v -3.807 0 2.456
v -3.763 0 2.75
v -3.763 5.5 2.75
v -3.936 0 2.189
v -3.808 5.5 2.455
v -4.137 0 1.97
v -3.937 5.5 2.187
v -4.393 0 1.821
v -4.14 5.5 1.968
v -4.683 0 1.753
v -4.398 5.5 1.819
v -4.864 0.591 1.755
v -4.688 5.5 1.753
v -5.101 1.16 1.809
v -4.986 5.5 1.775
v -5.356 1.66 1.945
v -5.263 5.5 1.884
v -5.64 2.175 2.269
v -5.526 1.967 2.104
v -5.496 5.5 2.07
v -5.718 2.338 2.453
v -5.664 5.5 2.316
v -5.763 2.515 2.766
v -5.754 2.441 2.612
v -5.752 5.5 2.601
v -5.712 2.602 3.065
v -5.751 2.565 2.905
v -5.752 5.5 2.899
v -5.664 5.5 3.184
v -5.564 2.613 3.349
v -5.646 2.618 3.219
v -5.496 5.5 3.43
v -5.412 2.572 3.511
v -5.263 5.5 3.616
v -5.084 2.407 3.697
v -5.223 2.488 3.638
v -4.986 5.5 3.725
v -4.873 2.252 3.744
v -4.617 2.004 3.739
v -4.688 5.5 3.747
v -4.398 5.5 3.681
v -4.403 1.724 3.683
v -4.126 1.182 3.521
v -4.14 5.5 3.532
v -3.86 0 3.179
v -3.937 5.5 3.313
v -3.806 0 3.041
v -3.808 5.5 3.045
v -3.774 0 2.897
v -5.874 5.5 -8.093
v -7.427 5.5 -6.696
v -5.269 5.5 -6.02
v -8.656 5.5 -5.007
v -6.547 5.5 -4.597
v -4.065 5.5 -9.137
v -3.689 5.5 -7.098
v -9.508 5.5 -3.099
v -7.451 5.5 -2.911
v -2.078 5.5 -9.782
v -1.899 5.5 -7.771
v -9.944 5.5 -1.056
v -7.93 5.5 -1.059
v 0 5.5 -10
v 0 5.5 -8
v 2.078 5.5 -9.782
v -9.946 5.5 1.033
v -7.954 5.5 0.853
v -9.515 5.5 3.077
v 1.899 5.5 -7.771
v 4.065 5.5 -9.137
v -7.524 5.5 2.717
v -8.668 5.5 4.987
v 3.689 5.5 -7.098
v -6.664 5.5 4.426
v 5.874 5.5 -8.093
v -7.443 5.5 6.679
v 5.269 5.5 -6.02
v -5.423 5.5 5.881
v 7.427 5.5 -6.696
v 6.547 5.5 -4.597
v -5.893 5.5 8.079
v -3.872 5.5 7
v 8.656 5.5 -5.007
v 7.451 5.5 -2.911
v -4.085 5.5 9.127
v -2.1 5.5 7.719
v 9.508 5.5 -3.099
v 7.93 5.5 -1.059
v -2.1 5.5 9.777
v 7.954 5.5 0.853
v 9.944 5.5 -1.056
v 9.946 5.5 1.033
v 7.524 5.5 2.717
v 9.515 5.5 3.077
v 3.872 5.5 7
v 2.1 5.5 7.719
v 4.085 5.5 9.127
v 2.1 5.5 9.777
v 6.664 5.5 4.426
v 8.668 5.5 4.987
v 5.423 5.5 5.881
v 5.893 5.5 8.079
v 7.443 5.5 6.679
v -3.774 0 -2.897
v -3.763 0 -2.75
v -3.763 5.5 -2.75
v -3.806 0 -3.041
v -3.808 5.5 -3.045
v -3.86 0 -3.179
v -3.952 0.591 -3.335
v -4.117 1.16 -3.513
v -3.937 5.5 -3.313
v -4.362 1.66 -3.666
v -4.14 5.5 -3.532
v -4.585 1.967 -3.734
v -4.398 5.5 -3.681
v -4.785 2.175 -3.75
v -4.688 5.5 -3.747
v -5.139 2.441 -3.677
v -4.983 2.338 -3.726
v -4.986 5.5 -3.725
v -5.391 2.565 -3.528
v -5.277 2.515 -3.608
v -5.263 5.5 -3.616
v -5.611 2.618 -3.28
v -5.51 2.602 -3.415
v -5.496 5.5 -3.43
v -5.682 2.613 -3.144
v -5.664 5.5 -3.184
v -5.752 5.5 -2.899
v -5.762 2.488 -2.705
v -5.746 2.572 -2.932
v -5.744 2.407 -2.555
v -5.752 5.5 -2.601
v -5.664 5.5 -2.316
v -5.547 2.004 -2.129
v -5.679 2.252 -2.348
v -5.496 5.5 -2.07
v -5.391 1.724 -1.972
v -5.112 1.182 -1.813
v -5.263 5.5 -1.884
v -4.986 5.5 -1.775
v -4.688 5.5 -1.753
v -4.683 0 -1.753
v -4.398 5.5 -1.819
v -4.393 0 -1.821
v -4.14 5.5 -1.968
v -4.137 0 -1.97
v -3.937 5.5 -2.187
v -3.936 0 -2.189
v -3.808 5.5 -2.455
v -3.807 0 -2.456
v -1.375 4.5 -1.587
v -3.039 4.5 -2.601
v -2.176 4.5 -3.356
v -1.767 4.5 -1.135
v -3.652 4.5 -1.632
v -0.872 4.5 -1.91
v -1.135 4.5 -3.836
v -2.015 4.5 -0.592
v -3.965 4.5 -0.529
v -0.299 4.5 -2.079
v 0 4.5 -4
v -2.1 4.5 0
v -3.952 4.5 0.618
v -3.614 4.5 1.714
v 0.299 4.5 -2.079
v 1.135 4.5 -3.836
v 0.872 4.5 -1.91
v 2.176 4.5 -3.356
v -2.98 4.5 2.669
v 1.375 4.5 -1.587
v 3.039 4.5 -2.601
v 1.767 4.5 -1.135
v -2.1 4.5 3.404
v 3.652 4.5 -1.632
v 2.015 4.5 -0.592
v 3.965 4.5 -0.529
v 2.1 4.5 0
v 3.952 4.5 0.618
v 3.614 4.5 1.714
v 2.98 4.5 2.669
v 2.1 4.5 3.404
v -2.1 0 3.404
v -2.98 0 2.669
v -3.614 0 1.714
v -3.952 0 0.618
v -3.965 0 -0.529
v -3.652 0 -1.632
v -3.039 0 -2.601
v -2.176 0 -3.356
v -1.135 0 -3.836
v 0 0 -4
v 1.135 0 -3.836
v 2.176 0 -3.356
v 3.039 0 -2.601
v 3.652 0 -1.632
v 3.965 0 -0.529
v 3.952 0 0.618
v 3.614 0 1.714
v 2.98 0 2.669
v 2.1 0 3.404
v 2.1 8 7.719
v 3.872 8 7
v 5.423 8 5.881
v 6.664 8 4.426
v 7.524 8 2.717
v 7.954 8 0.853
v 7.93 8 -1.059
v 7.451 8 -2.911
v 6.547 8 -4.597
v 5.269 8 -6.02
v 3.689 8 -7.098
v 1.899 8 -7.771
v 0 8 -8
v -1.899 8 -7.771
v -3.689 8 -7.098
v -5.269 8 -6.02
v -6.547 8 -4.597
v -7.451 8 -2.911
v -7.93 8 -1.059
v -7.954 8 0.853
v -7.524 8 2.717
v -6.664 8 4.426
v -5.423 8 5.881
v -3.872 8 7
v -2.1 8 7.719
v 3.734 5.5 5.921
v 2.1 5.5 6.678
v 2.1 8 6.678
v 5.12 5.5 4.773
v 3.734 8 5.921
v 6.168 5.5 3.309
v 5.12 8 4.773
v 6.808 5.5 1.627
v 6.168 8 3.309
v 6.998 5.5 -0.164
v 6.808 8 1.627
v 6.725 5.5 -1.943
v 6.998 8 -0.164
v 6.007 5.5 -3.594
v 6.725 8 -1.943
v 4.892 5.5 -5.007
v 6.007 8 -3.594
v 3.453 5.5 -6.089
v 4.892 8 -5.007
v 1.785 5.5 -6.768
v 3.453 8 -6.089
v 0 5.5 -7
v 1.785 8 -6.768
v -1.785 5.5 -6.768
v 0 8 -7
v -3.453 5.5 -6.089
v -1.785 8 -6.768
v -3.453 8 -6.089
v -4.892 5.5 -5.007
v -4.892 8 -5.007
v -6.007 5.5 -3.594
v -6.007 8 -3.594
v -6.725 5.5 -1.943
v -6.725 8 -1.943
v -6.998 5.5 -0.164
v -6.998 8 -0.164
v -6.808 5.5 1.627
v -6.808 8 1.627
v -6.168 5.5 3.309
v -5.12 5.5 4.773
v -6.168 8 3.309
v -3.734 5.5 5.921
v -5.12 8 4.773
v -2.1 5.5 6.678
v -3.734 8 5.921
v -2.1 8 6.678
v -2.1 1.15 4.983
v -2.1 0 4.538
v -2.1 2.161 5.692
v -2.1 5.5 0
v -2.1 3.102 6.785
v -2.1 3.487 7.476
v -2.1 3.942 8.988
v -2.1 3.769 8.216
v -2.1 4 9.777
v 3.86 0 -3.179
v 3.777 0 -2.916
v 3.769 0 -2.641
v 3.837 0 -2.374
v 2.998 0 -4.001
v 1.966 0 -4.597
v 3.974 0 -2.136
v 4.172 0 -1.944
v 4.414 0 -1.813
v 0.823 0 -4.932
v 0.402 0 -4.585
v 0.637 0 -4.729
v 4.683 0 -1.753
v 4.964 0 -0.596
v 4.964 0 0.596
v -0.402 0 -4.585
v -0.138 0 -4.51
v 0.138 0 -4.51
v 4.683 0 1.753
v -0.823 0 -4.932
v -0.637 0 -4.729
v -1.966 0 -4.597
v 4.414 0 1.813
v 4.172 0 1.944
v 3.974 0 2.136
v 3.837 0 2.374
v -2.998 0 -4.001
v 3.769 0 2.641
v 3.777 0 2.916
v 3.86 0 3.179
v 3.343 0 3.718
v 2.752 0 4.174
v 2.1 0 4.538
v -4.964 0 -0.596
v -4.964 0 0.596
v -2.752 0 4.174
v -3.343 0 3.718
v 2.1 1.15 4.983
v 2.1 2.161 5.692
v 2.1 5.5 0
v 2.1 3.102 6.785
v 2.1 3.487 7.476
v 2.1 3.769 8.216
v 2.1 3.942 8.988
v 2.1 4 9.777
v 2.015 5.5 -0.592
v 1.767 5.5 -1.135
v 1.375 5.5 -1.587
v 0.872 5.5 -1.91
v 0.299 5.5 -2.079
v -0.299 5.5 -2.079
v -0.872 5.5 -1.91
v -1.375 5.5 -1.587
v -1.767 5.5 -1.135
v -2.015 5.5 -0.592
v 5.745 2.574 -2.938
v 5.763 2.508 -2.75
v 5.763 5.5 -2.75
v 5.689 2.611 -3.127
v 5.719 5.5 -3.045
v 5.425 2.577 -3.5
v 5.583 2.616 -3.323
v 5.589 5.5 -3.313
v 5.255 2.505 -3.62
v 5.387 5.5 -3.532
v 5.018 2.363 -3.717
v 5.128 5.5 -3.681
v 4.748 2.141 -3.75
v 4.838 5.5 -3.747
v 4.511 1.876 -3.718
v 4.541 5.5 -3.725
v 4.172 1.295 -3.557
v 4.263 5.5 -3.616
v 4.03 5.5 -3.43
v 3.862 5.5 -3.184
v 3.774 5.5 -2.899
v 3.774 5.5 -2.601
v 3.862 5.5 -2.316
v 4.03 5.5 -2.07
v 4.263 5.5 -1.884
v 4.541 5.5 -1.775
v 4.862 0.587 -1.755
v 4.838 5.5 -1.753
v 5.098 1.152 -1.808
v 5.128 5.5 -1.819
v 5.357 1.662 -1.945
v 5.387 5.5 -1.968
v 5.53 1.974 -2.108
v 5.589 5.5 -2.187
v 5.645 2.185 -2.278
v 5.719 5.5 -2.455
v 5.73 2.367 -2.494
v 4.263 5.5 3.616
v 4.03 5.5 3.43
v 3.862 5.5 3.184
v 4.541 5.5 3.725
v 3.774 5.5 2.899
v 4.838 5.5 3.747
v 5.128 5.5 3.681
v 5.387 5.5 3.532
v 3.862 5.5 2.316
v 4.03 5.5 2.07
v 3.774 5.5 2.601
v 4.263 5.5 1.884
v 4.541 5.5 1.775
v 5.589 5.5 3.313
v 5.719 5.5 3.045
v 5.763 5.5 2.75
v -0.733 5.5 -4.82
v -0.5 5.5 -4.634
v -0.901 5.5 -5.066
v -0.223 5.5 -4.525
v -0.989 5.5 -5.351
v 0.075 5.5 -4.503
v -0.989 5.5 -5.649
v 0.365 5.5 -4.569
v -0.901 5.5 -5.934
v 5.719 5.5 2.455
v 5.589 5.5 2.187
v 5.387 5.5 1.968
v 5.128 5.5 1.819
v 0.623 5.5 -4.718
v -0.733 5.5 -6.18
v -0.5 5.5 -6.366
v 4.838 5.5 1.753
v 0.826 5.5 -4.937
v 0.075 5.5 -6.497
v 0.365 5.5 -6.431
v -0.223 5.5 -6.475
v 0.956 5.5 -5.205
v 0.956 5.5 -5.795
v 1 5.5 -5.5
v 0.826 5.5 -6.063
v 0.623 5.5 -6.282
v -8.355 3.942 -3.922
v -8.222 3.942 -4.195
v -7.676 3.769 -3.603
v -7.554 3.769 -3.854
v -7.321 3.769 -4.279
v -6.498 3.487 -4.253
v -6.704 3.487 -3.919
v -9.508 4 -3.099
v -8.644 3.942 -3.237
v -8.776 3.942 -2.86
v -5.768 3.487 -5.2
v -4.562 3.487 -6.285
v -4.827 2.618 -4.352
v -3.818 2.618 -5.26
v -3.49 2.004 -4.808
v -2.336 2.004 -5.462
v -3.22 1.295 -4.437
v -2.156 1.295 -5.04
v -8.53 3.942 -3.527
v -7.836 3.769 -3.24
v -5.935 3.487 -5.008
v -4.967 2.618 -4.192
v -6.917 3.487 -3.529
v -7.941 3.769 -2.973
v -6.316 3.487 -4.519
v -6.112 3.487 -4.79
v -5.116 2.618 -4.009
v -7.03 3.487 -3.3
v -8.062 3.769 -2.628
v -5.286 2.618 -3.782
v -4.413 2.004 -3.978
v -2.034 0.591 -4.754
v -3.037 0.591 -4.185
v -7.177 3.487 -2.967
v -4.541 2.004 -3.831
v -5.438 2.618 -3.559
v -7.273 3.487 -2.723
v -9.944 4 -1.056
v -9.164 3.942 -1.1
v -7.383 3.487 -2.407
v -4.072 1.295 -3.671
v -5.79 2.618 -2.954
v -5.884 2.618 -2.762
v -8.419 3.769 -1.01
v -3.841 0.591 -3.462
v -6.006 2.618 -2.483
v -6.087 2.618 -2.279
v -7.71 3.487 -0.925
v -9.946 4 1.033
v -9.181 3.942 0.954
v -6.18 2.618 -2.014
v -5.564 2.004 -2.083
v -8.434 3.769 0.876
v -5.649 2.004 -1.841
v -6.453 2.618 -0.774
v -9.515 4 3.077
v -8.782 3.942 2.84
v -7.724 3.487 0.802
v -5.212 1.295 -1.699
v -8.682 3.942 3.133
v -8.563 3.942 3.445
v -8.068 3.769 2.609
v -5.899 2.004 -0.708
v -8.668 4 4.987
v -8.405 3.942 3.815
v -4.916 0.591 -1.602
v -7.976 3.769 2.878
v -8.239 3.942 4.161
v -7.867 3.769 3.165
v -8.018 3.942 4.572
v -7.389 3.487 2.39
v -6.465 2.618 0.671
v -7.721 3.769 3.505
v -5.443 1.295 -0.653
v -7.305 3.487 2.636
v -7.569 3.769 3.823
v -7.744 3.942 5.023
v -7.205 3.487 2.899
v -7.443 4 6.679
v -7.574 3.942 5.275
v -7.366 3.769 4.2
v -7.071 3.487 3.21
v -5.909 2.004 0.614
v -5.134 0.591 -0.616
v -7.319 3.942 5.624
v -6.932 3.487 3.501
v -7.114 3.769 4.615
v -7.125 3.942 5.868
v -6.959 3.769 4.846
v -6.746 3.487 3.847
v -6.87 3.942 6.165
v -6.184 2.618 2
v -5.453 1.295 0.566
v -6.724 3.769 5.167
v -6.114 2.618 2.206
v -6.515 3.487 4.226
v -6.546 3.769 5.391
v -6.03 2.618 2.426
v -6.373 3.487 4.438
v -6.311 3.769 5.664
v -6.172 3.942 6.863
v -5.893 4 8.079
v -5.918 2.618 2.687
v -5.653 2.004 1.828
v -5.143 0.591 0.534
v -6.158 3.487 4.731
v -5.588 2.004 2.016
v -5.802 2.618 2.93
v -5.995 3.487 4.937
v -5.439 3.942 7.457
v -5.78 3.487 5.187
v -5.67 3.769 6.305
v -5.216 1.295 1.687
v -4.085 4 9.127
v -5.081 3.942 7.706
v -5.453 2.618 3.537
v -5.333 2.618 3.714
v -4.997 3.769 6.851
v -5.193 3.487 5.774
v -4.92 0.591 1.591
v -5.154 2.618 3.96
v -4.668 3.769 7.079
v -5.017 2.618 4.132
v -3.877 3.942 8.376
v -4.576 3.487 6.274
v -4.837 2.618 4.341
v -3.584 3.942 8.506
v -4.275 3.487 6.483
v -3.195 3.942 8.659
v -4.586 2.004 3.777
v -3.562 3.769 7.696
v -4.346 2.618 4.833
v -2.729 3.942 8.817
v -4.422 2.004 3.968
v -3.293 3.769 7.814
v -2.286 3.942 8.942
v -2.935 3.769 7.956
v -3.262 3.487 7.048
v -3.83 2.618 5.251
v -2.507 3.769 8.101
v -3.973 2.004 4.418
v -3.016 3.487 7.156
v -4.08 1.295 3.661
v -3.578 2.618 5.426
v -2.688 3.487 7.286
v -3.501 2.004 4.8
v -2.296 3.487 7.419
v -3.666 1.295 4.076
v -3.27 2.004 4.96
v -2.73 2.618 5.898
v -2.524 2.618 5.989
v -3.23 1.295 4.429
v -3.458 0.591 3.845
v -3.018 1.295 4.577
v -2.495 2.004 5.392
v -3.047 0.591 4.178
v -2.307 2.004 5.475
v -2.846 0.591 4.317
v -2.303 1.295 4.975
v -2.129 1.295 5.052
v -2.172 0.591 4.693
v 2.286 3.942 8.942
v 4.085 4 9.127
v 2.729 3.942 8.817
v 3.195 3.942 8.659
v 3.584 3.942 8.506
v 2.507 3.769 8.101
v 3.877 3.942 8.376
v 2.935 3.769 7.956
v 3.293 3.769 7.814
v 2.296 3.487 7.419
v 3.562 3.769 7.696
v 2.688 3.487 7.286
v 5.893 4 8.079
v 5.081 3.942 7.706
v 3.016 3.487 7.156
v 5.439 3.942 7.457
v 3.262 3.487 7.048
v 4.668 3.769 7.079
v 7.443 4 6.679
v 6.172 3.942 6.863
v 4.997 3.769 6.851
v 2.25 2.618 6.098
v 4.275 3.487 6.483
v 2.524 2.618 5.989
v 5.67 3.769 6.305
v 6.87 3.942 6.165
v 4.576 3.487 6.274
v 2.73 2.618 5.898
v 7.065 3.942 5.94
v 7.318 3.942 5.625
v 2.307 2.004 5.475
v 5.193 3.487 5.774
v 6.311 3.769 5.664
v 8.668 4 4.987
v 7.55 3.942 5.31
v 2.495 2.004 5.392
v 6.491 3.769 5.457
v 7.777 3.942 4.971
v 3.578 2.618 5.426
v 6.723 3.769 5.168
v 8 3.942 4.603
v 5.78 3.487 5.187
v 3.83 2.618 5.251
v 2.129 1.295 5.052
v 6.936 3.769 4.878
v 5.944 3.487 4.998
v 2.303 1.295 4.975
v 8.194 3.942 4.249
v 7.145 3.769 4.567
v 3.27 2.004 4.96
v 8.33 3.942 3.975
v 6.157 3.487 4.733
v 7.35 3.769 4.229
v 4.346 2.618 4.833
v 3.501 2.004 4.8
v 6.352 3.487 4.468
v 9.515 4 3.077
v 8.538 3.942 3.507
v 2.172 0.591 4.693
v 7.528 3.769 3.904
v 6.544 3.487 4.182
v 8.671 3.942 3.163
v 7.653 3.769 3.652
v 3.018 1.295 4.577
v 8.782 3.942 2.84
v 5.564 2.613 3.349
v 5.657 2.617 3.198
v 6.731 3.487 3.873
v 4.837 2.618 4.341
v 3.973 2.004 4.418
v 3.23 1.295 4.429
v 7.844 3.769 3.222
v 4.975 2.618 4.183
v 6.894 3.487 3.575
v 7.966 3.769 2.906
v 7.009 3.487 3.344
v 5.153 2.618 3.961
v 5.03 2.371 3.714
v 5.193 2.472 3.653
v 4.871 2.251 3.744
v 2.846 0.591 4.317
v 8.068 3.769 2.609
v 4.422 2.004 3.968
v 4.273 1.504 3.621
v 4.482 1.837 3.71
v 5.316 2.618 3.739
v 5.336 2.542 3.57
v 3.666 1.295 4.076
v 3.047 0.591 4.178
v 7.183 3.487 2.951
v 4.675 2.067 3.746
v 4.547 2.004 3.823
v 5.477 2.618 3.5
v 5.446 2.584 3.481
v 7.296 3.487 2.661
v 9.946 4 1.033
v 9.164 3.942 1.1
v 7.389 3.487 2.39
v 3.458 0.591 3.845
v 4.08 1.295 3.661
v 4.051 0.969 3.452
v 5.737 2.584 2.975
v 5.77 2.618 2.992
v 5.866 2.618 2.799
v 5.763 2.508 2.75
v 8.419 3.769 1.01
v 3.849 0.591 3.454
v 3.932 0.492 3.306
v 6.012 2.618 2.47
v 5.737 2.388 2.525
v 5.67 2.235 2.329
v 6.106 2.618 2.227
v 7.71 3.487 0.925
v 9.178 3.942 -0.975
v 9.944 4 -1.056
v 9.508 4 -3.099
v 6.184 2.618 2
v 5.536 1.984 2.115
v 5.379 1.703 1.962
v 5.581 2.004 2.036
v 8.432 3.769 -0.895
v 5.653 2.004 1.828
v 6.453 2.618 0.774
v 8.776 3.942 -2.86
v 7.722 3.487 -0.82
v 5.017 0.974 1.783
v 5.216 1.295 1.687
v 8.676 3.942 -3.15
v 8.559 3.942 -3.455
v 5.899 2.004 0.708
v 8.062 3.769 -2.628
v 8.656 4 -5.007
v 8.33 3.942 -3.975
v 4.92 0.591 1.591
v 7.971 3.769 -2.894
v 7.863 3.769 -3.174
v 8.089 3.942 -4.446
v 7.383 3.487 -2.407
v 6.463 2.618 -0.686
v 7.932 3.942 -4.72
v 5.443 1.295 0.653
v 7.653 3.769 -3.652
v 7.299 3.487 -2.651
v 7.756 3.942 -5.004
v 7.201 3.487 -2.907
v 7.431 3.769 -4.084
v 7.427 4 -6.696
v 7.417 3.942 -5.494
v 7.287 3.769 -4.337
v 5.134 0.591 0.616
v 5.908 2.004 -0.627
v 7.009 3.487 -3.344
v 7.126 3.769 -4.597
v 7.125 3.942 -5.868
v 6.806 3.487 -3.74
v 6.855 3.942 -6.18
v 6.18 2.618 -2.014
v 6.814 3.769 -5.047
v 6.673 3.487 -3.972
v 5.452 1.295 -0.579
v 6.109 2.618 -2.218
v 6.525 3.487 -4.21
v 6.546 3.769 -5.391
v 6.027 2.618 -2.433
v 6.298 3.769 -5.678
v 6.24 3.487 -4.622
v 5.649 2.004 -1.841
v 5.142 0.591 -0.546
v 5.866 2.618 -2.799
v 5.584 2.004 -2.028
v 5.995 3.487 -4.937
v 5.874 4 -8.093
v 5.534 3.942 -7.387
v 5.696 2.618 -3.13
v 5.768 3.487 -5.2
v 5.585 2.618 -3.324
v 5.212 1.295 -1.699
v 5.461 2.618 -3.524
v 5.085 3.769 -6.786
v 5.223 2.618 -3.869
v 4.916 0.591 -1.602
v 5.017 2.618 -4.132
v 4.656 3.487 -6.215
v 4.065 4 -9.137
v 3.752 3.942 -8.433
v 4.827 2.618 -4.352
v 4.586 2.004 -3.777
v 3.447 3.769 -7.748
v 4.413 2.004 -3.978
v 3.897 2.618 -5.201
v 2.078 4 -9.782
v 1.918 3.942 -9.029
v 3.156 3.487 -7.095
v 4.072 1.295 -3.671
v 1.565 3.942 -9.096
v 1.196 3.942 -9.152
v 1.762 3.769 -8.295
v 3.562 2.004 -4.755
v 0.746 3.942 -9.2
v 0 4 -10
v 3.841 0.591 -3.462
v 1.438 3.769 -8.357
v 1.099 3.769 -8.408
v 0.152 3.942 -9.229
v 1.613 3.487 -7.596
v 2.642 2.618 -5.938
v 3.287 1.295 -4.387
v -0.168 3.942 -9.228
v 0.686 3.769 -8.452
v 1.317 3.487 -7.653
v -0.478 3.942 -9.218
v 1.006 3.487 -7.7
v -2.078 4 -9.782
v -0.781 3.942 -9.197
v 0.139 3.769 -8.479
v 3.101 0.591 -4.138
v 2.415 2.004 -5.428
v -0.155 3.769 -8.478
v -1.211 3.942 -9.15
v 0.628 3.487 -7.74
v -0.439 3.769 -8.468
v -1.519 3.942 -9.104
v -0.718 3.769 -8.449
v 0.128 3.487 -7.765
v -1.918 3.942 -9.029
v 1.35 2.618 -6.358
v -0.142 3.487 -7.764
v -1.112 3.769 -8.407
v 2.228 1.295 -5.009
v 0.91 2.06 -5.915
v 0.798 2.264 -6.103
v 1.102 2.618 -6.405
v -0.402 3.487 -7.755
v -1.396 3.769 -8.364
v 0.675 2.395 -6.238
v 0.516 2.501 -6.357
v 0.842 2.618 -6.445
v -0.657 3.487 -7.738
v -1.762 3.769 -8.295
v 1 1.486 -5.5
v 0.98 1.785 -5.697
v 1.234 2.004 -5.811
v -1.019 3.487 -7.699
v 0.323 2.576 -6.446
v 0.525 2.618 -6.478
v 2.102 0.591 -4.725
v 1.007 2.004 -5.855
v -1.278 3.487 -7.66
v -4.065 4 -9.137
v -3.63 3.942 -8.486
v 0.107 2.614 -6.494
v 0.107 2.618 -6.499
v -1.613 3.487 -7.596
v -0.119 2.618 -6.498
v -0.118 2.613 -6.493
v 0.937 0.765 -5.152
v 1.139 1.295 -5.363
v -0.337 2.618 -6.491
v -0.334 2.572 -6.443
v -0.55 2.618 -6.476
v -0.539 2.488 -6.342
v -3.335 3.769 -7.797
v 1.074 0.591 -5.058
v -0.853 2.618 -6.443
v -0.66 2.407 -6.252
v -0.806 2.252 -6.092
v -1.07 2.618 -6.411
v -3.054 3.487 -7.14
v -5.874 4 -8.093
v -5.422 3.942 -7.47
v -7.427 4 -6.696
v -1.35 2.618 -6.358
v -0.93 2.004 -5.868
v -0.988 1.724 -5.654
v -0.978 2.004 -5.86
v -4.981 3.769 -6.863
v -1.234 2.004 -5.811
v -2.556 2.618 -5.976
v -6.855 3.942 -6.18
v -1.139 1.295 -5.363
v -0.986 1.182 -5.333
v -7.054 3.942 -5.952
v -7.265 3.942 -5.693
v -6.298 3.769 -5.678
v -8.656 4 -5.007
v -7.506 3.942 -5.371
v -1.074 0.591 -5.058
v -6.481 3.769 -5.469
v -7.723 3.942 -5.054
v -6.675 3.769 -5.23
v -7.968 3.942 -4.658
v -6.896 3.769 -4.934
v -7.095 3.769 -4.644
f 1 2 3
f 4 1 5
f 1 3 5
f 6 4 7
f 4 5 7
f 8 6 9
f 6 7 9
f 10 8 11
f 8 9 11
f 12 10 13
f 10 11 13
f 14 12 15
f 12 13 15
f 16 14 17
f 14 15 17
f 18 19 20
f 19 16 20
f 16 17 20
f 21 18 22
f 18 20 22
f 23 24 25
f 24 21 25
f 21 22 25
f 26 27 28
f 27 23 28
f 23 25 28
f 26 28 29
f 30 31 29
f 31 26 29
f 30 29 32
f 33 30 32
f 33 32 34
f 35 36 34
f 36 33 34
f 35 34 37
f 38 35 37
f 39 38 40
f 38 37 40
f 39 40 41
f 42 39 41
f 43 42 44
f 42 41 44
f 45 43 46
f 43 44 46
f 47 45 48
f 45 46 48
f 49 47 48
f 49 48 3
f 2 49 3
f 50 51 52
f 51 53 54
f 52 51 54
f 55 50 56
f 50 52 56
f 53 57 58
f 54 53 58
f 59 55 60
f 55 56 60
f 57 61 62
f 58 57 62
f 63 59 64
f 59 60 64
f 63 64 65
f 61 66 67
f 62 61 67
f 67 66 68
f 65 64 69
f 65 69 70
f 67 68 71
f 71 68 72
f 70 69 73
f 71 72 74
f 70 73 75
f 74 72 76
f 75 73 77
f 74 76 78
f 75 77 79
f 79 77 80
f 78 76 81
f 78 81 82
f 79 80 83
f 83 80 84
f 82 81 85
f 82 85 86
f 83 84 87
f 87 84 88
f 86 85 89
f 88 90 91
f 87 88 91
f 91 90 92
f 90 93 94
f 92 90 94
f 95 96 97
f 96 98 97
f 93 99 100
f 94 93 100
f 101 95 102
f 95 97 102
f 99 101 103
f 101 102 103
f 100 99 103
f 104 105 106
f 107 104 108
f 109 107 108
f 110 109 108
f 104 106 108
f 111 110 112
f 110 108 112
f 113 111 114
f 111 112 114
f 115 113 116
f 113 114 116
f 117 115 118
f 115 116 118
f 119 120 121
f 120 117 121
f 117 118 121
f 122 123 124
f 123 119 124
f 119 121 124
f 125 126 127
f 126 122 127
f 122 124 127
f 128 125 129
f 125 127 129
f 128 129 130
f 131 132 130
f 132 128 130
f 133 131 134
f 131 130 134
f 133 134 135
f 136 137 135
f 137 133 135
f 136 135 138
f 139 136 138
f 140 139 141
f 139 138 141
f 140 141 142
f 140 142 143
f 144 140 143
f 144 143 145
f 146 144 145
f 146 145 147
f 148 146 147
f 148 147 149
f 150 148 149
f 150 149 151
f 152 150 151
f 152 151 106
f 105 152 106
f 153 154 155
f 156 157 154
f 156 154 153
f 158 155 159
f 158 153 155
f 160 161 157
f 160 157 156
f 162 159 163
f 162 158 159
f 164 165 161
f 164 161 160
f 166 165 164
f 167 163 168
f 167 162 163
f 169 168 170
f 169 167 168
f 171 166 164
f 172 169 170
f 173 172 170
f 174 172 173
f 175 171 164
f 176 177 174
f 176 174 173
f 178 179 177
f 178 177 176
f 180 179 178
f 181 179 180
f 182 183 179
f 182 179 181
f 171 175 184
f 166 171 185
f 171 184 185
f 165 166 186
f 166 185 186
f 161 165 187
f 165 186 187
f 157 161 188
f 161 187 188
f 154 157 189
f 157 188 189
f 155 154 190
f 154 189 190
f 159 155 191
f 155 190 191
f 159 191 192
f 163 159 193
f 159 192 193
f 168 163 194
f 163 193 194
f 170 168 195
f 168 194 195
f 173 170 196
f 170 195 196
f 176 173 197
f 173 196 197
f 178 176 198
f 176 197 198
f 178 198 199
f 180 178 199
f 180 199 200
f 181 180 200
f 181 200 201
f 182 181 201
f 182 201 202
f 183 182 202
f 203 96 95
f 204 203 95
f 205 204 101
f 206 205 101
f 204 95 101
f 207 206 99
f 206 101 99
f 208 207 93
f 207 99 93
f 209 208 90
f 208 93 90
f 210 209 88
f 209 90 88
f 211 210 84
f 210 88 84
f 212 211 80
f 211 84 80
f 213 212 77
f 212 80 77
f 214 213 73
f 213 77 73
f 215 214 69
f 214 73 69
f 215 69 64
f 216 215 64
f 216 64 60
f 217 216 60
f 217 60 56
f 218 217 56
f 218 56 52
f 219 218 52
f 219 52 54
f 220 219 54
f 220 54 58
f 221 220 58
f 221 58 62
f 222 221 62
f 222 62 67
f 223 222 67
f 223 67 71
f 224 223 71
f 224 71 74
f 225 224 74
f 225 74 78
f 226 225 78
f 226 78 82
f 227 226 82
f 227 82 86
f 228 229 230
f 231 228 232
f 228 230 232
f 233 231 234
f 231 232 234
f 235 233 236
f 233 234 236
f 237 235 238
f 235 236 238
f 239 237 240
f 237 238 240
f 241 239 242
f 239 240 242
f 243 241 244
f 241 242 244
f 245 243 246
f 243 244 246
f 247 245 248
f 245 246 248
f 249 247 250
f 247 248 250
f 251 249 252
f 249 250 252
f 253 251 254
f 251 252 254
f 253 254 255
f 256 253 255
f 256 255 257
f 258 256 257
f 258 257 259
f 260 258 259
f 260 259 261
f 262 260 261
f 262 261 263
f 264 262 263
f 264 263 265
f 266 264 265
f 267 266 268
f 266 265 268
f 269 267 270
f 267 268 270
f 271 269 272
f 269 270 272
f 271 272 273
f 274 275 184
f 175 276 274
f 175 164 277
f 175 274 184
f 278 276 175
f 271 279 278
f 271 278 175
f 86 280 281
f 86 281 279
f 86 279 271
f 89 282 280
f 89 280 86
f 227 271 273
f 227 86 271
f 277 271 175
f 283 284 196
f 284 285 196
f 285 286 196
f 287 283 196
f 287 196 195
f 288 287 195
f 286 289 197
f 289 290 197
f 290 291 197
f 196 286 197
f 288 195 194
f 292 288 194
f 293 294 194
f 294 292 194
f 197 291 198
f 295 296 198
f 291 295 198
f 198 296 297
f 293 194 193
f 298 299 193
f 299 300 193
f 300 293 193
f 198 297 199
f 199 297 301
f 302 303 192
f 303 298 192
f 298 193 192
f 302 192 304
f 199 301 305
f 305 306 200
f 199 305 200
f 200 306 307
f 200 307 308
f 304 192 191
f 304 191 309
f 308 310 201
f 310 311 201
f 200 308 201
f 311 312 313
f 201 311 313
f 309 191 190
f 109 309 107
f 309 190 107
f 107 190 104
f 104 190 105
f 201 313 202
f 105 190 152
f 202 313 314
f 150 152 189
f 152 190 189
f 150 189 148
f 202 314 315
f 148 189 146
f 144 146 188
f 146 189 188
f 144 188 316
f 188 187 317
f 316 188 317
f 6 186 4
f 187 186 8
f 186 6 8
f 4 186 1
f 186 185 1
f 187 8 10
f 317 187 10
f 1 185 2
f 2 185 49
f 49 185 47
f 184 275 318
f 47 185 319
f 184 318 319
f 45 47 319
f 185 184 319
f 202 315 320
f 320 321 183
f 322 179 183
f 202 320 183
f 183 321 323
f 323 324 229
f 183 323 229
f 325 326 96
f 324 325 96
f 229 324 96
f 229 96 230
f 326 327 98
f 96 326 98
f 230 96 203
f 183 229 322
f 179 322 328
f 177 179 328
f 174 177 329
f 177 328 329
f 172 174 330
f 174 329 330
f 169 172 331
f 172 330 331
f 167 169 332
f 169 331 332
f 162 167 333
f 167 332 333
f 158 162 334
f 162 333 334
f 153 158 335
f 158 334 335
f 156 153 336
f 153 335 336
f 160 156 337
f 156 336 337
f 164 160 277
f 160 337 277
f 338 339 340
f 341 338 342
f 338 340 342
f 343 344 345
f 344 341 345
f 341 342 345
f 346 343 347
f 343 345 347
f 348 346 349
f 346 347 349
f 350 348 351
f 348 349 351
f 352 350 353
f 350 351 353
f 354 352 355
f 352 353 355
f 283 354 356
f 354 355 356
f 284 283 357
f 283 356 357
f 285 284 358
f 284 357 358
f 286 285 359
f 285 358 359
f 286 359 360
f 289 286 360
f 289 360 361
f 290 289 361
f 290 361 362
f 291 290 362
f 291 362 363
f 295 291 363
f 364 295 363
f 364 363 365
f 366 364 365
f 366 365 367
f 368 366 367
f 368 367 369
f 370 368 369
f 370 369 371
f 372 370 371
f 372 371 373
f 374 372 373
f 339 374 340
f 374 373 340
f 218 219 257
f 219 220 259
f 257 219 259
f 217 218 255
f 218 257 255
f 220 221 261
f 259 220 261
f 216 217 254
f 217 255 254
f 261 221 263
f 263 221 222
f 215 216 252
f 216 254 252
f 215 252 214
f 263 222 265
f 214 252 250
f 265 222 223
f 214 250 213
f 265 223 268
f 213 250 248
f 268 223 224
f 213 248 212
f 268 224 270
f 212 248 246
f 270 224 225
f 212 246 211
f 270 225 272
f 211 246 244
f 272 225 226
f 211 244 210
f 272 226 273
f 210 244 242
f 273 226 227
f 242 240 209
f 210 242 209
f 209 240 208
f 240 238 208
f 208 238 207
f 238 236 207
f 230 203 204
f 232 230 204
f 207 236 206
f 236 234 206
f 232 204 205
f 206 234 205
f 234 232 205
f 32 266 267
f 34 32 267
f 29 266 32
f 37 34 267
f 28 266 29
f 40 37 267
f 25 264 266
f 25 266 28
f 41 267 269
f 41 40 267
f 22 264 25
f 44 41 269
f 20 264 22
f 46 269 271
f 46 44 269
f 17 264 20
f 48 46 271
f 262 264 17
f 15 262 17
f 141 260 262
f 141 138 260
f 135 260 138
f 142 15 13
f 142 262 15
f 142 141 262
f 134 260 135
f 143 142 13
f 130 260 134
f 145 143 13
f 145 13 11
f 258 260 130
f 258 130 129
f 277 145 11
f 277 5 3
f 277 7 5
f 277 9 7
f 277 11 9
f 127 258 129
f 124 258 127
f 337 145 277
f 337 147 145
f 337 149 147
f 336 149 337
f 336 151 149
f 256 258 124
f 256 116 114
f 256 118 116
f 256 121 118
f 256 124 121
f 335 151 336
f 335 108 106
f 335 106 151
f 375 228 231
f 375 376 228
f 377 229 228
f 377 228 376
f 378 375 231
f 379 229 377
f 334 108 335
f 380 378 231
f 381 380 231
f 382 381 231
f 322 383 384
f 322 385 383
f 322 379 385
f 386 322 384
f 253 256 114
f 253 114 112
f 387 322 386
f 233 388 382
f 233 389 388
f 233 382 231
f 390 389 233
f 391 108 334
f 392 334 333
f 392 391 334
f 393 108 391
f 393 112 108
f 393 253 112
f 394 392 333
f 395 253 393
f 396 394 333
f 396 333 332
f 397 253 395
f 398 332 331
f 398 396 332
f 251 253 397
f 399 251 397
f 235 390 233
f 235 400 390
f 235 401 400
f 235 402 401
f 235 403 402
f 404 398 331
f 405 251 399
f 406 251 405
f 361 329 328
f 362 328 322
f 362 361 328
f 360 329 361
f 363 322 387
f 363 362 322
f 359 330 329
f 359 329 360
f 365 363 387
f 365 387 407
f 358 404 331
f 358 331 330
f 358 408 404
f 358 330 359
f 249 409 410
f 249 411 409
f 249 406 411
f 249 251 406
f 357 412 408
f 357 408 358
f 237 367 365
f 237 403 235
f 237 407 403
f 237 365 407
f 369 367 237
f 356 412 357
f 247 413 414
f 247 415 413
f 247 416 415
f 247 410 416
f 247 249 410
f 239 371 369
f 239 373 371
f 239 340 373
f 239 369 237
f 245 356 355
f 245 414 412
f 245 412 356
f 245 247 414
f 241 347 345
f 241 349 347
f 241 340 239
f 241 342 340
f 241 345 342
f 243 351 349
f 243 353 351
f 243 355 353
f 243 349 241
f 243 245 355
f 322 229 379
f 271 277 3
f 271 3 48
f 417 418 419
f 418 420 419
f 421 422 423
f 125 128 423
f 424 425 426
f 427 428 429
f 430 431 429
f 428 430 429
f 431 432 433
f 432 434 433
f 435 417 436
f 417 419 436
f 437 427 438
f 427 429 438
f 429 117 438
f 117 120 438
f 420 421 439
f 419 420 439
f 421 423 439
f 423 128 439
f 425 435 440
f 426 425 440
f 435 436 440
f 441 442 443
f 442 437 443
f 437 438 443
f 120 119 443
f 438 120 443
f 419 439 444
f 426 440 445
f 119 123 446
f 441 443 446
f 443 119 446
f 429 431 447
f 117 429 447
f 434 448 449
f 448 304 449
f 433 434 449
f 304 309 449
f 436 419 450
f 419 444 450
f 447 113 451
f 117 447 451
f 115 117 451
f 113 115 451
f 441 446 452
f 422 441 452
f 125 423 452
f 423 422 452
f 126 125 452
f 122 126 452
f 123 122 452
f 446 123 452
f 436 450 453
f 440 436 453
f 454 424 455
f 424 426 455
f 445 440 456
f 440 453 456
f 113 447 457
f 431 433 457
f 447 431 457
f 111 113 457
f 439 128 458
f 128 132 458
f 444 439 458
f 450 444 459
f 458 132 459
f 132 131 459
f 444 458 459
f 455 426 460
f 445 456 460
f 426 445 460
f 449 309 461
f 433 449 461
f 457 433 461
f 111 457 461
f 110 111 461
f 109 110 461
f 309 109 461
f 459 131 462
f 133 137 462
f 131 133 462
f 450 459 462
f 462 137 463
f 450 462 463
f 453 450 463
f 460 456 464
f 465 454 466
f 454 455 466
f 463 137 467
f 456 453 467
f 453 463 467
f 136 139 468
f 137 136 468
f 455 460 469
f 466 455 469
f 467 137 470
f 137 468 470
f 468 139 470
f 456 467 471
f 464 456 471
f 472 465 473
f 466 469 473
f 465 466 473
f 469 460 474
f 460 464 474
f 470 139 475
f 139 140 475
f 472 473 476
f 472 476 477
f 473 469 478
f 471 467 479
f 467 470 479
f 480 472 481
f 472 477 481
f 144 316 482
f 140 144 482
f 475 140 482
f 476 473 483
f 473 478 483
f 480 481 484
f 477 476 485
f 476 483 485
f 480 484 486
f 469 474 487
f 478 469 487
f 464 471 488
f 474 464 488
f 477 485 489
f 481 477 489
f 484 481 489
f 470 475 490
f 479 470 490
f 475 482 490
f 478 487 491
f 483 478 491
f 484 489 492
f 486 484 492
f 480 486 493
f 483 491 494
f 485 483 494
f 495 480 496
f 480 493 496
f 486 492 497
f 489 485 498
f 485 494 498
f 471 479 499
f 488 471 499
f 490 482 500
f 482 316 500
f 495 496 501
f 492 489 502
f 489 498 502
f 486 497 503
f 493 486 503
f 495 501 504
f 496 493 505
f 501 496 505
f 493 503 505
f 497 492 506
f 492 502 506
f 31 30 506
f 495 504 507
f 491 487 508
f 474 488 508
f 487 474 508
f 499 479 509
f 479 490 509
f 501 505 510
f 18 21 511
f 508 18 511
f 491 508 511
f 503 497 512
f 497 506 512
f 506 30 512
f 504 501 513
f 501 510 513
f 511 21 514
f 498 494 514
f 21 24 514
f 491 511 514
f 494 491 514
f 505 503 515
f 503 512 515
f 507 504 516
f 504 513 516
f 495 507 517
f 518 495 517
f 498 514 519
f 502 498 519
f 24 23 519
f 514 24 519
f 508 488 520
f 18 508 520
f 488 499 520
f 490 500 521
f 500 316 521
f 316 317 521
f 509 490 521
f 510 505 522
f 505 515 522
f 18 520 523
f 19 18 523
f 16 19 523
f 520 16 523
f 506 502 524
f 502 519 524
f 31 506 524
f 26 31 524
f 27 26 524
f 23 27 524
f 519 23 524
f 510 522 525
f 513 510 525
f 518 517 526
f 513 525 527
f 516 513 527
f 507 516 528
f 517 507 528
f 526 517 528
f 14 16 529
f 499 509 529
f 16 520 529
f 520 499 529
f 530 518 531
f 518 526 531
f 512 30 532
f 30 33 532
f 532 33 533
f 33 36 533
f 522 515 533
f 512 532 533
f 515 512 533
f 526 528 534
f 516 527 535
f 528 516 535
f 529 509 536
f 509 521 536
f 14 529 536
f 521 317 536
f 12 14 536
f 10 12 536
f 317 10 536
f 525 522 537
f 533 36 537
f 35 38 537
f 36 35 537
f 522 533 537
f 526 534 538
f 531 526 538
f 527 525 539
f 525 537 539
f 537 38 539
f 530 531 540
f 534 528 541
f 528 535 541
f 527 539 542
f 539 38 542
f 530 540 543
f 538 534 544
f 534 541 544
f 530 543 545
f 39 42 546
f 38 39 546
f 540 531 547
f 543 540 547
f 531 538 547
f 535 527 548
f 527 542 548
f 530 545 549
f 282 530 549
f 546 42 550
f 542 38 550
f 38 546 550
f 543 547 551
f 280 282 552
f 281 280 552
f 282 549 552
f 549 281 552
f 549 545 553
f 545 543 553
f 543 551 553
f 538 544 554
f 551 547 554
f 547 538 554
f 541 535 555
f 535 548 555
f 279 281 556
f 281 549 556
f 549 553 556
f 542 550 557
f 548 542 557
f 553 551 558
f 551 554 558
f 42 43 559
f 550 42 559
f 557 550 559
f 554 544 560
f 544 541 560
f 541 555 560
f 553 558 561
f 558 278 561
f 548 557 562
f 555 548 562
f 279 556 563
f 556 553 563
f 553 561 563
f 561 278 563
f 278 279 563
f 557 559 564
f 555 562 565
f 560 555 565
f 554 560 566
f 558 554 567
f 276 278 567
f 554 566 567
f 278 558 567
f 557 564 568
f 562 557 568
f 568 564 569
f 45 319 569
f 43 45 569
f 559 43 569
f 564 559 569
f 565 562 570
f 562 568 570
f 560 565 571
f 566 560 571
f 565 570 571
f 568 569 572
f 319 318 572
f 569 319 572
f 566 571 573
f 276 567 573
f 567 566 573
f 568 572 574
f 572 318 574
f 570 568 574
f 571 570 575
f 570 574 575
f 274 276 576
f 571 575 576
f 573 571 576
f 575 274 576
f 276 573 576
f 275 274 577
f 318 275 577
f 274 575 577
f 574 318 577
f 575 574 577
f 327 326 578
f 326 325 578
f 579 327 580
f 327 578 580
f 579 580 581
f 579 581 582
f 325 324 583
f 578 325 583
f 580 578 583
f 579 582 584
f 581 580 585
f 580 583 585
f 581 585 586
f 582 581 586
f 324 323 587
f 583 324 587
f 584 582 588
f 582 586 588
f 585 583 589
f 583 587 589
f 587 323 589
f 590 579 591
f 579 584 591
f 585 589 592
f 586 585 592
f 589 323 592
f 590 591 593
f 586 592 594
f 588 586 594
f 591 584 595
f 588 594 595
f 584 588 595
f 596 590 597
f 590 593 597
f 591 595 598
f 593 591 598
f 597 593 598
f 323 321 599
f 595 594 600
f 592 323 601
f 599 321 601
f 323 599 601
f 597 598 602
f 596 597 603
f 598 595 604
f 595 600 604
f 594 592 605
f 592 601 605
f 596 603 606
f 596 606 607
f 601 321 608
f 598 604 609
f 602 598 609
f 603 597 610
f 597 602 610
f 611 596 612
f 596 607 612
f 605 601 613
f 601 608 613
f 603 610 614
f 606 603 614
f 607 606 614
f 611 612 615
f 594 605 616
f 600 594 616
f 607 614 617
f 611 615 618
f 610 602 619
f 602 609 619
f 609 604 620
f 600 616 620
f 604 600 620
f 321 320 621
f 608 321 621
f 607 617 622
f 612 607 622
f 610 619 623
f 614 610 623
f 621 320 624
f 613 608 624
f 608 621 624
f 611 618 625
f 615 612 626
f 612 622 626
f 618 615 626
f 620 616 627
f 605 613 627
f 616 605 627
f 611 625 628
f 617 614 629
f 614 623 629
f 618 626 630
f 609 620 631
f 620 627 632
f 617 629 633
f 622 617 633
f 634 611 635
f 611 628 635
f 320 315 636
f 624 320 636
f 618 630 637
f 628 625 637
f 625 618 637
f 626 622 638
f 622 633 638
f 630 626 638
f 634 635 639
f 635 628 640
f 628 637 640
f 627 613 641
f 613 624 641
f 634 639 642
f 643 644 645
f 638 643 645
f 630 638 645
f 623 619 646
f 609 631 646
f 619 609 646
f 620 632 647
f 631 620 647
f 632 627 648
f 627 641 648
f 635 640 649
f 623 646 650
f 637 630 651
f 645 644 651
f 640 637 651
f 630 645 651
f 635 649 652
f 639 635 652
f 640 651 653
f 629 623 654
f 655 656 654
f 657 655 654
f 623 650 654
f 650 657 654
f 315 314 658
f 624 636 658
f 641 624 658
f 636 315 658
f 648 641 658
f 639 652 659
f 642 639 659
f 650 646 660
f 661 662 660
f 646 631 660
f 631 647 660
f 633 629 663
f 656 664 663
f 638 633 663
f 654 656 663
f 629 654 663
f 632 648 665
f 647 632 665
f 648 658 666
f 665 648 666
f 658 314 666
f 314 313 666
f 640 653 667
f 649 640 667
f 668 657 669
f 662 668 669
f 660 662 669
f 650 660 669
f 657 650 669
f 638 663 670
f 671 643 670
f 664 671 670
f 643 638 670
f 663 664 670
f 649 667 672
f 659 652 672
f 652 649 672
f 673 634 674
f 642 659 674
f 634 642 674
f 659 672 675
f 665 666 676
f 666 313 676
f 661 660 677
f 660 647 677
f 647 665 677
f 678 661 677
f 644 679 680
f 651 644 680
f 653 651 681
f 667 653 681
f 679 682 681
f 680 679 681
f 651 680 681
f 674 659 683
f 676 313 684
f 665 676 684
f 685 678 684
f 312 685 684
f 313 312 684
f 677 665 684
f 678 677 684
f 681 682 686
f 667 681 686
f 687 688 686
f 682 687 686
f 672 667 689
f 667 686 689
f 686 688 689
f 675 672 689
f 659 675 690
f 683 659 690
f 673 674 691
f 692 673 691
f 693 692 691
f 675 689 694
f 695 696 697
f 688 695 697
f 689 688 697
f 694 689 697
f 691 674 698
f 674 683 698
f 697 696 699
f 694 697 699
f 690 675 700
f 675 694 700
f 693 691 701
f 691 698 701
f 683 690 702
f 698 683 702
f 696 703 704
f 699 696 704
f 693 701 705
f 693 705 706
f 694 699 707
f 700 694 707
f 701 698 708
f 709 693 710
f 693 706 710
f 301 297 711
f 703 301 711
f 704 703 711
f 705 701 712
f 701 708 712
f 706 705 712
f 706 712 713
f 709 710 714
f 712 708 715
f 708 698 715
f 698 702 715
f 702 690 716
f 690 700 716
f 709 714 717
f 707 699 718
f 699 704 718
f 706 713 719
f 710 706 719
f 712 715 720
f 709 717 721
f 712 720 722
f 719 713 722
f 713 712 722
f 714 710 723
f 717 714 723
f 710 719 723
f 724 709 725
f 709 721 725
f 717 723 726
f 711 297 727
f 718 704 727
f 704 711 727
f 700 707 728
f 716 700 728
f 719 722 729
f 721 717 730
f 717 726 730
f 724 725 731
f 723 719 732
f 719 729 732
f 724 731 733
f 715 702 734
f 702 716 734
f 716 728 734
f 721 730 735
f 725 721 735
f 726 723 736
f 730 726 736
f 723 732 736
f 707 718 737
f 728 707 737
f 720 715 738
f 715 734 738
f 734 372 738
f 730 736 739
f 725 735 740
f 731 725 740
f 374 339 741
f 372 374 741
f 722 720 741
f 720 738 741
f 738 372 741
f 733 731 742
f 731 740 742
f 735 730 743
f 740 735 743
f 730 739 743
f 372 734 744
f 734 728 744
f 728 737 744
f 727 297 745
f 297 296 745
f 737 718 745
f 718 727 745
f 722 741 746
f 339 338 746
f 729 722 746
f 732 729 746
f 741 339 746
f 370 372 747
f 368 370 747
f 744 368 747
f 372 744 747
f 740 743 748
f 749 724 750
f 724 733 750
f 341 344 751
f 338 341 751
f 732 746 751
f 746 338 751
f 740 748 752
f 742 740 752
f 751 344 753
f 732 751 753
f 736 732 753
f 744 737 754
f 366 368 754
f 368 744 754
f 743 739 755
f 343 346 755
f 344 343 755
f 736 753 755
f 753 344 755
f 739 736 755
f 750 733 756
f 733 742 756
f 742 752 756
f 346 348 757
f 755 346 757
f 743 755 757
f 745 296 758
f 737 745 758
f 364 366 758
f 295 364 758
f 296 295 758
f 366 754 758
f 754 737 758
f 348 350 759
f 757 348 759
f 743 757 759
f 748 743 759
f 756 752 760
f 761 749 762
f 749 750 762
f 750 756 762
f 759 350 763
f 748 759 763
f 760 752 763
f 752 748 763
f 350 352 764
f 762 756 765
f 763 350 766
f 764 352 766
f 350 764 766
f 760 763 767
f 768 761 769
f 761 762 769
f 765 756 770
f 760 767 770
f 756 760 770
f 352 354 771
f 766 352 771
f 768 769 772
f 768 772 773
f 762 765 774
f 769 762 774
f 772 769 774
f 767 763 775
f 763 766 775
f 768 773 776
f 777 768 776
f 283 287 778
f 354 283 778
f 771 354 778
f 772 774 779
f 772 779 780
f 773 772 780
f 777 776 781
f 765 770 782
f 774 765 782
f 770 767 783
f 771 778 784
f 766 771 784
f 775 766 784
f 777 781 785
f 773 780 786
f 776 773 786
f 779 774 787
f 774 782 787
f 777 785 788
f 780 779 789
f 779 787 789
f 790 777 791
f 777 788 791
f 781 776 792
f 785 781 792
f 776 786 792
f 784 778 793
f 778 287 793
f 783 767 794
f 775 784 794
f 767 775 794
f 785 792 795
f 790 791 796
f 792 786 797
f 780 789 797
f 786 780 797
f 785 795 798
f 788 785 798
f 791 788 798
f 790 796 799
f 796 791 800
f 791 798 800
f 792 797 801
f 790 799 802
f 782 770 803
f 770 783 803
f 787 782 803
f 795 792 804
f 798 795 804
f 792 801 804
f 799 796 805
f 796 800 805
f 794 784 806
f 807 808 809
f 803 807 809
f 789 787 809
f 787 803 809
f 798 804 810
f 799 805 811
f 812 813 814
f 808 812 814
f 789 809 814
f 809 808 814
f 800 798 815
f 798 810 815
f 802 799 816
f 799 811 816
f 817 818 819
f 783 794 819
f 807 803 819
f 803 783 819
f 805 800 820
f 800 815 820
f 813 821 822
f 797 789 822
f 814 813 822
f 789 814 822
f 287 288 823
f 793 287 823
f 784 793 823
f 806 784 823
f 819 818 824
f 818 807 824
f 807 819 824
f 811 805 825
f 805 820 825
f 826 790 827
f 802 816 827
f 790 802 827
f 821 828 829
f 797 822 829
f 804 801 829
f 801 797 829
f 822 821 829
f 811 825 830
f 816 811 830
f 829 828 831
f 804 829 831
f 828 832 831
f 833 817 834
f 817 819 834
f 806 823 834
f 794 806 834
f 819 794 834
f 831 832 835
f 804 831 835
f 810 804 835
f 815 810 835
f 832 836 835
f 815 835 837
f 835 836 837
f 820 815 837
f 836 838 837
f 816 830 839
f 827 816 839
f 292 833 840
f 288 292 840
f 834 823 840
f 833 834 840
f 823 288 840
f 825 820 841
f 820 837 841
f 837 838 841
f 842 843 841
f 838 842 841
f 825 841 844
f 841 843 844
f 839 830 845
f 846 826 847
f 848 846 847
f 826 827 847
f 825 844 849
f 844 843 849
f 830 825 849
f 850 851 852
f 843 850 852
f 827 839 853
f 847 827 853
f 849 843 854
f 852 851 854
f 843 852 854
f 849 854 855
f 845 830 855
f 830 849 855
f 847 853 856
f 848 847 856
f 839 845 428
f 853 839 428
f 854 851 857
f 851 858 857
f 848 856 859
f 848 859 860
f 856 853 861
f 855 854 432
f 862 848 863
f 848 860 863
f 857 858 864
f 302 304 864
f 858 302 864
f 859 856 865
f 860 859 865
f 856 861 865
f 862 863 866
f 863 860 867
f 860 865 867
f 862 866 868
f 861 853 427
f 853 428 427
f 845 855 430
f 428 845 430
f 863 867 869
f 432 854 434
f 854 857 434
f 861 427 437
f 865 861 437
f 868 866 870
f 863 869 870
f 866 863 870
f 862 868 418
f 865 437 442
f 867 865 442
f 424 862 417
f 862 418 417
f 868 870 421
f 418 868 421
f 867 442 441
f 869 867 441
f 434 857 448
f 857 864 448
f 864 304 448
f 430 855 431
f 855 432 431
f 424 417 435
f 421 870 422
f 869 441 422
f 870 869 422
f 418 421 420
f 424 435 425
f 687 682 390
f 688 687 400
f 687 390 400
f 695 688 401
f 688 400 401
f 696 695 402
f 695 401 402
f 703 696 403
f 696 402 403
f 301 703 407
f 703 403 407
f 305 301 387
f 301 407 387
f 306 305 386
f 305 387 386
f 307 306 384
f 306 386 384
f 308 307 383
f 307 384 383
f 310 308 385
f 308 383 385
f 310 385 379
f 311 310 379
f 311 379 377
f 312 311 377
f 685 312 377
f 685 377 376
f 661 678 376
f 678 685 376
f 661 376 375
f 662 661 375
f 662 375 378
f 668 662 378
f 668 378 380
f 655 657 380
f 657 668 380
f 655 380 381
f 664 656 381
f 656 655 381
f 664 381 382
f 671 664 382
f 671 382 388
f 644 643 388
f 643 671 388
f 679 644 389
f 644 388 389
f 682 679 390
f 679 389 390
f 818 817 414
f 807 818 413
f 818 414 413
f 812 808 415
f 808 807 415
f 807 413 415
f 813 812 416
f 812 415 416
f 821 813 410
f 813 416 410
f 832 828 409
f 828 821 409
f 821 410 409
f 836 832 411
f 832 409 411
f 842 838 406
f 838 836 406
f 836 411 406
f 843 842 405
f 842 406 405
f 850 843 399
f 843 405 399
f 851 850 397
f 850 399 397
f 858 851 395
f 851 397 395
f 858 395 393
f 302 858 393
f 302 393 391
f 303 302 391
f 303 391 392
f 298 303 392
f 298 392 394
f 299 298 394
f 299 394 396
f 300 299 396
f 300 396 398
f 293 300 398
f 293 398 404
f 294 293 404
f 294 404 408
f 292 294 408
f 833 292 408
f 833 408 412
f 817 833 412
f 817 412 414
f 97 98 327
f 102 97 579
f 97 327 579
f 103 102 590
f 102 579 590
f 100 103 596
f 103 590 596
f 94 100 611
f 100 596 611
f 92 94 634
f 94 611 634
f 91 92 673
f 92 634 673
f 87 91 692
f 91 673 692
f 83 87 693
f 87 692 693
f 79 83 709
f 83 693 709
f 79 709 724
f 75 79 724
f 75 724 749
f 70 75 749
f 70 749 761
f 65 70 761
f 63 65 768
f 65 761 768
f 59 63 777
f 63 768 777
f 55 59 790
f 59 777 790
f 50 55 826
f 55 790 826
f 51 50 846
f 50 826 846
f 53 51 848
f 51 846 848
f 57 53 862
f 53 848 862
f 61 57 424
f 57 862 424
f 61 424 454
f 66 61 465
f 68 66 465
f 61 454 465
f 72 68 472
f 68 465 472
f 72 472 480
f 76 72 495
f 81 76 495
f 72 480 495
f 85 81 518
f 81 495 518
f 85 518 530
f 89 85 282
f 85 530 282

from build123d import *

# Parameters (mm, degrees)
SKETCH2_R          = 7
CUT_EXTRUDE1_DEPTH = 2.5
SKETCH3_R          = 2.1
CUT_EXTRUDE2_DEPTH = 6.5
SKETCH4_R          = 4
CUT_EXTRUDE3_DEPTH = 4.5
CUT_EXTRUDE4_REACH = 22
SKETCH5_W          = 4.2
SKETCH5_H          = 5.5
SKETCH5_H_2        = 3.449205174
SKETCH6_R          = 1
CUT_EXTRUDE5_DEPTH = 6.5000001


with BuildPart() as part:
    # Sketch1 → Revolve1 (revolve)
    with BuildSketch(Plane.XY):
        with BuildLine():
            Line((0, 0), (0, 8))
            Line((0, 8), (-8, 8))
            Line((-8, 8), (-8, 5.5))
            Line((-8, 5.5), (-10, 5.5))
            Line((-10, 5.5), (-10, 4))
            ThreePointArc((-10, 4), (-6.798437881, 2.876952648), (-5, 0))
            Line((-5, 0), (0, 0))
        make_face()
    revolve(axis=Axis((0, 0, 0), (0, 1, 0)))

    # Sketch2 → Cut-Extrude1 (cut)
    with BuildSketch(Plane(origin=(0, 8, 0), x_dir=(1, 0, 0), z_dir=(0, 1, 0))):
        Circle(SKETCH2_R)
    extrude(amount=-CUT_EXTRUDE1_DEPTH, mode=Mode.SUBTRACT)

    # Sketch3 → Cut-Extrude2 (cut, through all)
    with BuildSketch(Plane(origin=(0, 5.5, 0), x_dir=(1, 0, 0), z_dir=(0, 1, 0))):
        Circle(SKETCH3_R)
    extrude(amount=-CUT_EXTRUDE2_DEPTH, mode=Mode.SUBTRACT)

    # Sketch4 → Cut-Extrude3 (cut)
    with BuildSketch(Plane.XZ):
        Circle(SKETCH4_R)
    extrude(amount=-CUT_EXTRUDE3_DEPTH, mode=Mode.SUBTRACT)

    # Sketch5 → Cut-Extrude4 (cut, up to next)
    with BuildSketch(Plane.XY.offset(10), mode=Mode.PRIVATE) as cut_extrude4_sk1:
        with Locations((0, 2.75)):
            Rectangle(SKETCH5_W, SKETCH5_H)
    cut_extrude4_tool1 = extrude(cut_extrude4_sk1.sketch, amount=-CUT_EXTRUDE4_REACH, mode=Mode.PRIVATE) & part.part
    add(cut_extrude4_tool1.solids().sort_by_distance((0, 2.75, 10))[0], mode=Mode.SUBTRACT)
    # Sketch5 → Cut-Extrude4 (cut, up to next)
    with BuildSketch(Plane.XY.offset(10), mode=Mode.PRIVATE) as cut_extrude4_sk2:
        with Locations((0, 7.224602587)):
            Rectangle(SKETCH5_W, SKETCH5_H_2)
    cut_extrude4_tool2 = extrude(cut_extrude4_sk2.sketch, amount=-CUT_EXTRUDE4_REACH, mode=Mode.PRIVATE) & part.part
    add(cut_extrude4_tool2.solids().sort_by_distance((0, 7.224603, 10))[0], mode=Mode.SUBTRACT)

    # Sketch6 → Cut-Extrude5 (cut, through all)
    with BuildSketch(Plane(origin=(0, 5.5, 0), x_dir=(1, 0, 0), z_dir=(0, 1, 0))):
        with Locations((0, 5.5)):
            Circle(SKETCH6_R)
        with Locations((-4.763139721, 2.75)):
            Circle(SKETCH6_R)
        with Locations((-4.763139721, -2.75)):
            Circle(SKETCH6_R)
        with Locations((0, -5.5)):
            Circle(SKETCH6_R)
        with Locations((4.763139721, -2.75)):
            Circle(SKETCH6_R)
        with Locations((4.763139721, 2.75)):
            Circle(SKETCH6_R)
    extrude(amount=-CUT_EXTRUDE5_DEPTH, mode=Mode.SUBTRACT)


solid = part.part
